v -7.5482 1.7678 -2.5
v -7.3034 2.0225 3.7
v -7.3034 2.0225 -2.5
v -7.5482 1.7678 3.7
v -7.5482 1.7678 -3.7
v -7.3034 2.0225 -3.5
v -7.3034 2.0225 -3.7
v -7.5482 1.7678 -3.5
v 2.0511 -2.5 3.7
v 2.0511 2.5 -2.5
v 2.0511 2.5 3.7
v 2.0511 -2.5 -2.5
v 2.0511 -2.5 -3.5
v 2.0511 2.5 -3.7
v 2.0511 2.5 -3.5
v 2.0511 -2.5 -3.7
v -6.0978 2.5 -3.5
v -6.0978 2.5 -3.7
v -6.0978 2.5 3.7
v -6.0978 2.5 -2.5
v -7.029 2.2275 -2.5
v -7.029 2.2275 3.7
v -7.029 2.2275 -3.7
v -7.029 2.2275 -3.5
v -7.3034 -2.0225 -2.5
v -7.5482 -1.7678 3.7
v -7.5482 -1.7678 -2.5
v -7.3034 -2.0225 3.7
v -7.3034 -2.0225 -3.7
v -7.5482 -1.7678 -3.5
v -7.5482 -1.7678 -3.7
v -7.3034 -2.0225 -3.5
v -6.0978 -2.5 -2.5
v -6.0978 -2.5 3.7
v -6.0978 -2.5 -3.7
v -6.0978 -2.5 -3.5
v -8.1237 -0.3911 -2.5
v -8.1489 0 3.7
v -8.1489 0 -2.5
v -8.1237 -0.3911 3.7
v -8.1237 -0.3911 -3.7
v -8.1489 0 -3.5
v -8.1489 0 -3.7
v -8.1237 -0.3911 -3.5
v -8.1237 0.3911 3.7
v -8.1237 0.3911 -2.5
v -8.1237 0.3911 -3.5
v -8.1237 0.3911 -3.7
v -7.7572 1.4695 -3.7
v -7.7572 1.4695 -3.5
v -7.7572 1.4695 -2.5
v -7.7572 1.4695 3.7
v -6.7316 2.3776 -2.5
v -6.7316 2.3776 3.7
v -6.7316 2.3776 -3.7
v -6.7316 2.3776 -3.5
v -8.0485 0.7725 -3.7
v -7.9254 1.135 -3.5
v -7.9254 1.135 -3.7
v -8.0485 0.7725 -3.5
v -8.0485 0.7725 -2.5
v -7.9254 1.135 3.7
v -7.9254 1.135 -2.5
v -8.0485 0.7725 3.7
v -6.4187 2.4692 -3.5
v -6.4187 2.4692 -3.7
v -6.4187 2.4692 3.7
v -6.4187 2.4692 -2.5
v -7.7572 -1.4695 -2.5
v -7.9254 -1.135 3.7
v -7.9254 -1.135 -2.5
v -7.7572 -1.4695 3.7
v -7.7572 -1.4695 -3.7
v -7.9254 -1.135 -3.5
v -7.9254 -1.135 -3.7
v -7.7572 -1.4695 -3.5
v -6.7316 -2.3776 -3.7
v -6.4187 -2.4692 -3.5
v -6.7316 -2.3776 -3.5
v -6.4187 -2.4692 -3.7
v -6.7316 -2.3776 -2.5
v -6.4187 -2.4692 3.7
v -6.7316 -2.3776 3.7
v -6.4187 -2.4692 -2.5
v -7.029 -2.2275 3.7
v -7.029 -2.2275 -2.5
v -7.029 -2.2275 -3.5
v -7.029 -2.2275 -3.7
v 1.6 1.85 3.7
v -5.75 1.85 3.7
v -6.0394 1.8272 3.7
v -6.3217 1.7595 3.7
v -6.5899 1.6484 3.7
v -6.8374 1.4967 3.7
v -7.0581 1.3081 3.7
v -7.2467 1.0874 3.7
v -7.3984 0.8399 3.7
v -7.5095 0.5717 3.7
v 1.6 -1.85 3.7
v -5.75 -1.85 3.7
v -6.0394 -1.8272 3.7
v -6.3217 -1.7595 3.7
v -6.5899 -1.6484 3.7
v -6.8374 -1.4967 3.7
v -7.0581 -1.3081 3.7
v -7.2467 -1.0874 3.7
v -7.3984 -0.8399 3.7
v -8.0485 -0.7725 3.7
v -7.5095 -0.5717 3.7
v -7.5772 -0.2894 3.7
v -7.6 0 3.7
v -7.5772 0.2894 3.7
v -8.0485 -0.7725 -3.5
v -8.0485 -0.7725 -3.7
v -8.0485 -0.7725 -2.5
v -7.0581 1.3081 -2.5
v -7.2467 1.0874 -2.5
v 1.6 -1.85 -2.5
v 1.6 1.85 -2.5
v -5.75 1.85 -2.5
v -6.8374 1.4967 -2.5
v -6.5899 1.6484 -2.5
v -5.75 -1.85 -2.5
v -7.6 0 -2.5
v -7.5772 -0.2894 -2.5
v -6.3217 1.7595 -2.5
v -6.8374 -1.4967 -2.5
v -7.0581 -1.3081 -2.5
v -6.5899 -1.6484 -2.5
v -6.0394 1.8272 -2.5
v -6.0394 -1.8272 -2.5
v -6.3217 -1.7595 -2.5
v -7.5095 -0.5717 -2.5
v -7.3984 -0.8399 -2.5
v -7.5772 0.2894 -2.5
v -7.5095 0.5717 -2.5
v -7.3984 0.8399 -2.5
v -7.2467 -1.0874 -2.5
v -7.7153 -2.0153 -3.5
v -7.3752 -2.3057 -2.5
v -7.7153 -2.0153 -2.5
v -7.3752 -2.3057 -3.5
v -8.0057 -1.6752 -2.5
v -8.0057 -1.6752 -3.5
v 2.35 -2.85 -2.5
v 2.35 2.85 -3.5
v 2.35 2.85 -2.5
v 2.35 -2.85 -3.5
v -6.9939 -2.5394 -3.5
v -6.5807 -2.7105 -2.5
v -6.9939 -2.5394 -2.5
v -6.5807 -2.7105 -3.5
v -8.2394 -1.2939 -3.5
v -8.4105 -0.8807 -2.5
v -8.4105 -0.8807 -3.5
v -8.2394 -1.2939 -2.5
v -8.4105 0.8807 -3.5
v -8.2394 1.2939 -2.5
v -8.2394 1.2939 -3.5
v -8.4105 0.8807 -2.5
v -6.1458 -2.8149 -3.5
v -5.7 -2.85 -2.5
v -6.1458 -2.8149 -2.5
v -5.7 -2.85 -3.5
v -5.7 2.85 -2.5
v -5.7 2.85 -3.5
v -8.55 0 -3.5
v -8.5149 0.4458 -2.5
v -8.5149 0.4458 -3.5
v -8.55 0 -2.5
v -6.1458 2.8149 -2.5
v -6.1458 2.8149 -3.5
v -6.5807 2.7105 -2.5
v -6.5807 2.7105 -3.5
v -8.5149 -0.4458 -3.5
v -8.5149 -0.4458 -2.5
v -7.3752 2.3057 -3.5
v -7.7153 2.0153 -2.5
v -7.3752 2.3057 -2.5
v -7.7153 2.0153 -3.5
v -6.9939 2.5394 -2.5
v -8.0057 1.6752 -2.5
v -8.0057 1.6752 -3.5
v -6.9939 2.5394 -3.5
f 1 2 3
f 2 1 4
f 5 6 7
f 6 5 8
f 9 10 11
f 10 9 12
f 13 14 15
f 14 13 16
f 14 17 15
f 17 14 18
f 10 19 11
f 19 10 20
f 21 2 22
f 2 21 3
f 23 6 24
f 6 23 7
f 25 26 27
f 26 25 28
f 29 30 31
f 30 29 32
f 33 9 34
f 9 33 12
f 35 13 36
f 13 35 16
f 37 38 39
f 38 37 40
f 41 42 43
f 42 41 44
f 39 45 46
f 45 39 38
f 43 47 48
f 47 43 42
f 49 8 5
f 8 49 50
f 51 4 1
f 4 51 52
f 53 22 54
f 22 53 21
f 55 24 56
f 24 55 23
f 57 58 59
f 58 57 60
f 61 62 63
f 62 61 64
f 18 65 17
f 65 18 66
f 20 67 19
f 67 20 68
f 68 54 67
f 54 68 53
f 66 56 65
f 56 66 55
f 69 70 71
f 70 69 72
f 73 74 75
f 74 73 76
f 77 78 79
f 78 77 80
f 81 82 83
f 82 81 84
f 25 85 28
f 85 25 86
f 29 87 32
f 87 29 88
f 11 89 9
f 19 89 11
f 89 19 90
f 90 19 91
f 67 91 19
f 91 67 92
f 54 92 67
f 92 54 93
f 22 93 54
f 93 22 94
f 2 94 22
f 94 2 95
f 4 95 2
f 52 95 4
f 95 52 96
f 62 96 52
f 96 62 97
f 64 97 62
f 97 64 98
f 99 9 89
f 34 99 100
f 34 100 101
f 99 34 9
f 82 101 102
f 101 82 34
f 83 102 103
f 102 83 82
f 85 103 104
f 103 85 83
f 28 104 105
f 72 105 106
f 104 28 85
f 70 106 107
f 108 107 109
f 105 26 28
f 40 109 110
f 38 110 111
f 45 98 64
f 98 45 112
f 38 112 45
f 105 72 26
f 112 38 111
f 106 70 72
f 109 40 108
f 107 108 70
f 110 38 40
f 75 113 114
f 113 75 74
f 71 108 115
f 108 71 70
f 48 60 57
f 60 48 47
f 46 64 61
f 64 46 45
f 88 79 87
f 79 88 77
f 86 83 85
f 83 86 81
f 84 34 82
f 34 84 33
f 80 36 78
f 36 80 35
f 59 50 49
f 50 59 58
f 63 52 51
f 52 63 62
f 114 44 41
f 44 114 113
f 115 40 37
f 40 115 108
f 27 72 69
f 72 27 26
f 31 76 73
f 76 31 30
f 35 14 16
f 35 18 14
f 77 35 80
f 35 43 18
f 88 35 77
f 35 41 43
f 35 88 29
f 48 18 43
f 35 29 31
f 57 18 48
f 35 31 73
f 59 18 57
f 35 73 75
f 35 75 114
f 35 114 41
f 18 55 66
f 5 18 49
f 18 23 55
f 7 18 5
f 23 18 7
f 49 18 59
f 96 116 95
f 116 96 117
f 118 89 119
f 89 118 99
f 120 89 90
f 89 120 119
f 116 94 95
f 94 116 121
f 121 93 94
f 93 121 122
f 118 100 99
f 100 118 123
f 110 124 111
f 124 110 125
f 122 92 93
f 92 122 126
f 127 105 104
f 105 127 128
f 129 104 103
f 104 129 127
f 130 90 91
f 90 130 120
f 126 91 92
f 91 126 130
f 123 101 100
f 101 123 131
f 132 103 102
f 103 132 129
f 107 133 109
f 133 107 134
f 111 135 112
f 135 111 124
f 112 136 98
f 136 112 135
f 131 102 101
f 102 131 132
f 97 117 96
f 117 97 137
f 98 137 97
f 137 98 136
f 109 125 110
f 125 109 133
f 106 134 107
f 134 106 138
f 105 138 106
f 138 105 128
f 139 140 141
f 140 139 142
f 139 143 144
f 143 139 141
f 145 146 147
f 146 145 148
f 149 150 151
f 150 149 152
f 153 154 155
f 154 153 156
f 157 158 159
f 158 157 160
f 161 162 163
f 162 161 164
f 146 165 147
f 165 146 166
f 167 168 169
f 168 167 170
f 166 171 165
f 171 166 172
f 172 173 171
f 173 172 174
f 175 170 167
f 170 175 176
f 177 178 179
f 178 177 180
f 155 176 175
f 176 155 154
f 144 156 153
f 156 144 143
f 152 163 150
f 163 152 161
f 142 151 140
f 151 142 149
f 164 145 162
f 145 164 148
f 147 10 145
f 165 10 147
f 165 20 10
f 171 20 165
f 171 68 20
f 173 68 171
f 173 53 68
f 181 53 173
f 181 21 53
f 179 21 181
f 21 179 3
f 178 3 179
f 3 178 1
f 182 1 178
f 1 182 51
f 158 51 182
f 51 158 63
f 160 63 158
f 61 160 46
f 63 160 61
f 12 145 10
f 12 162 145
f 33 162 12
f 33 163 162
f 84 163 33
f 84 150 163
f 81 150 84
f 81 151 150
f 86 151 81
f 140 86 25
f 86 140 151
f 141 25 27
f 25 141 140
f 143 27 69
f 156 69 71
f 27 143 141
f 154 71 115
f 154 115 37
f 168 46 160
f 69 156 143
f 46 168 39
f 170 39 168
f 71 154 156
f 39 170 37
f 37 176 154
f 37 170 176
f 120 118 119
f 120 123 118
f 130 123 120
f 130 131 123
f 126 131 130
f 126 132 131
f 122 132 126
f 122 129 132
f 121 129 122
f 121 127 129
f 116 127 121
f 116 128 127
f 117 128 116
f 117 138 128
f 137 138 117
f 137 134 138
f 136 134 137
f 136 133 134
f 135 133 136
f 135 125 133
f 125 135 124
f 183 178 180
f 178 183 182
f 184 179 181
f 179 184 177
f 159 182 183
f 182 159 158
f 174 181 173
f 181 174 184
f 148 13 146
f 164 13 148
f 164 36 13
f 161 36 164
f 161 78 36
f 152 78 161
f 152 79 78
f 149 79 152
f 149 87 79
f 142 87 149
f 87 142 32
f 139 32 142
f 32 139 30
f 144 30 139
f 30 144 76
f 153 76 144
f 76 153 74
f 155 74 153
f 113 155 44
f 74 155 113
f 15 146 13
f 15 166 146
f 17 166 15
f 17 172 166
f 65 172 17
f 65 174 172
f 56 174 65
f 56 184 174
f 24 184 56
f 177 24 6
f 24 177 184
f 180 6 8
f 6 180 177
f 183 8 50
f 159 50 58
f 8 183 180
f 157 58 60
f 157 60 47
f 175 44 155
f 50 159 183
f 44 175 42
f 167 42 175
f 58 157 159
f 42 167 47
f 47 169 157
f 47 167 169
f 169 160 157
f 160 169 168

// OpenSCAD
$fn=40;

iwidth=3.7;
ilen=5.5;
iheight=7;

module interior() {
    hull() {
        translate([ilen, 0, 0]) cylinder(d=iwidth, h=iheight, center=true);
        cube([iwidth, iwidth, iheight], center=true);
    }
}

module xt30() {
    difference() {
        resize([ilen+iwidth+1, 5, iheight+.4]) interior();
        translate([.25, 0, -.25]) interior();
    }

    translate([0, 0, 3]) {
        hull() {
            cube([iwidth+1, iwidth+2, 1], center=true);
            translate([ilen+.2, 0, 0]) cylinder(d=iwidth+2, h=1, center=true);
        }
    }
}

rotate([0, 180, 0]) xt30();
